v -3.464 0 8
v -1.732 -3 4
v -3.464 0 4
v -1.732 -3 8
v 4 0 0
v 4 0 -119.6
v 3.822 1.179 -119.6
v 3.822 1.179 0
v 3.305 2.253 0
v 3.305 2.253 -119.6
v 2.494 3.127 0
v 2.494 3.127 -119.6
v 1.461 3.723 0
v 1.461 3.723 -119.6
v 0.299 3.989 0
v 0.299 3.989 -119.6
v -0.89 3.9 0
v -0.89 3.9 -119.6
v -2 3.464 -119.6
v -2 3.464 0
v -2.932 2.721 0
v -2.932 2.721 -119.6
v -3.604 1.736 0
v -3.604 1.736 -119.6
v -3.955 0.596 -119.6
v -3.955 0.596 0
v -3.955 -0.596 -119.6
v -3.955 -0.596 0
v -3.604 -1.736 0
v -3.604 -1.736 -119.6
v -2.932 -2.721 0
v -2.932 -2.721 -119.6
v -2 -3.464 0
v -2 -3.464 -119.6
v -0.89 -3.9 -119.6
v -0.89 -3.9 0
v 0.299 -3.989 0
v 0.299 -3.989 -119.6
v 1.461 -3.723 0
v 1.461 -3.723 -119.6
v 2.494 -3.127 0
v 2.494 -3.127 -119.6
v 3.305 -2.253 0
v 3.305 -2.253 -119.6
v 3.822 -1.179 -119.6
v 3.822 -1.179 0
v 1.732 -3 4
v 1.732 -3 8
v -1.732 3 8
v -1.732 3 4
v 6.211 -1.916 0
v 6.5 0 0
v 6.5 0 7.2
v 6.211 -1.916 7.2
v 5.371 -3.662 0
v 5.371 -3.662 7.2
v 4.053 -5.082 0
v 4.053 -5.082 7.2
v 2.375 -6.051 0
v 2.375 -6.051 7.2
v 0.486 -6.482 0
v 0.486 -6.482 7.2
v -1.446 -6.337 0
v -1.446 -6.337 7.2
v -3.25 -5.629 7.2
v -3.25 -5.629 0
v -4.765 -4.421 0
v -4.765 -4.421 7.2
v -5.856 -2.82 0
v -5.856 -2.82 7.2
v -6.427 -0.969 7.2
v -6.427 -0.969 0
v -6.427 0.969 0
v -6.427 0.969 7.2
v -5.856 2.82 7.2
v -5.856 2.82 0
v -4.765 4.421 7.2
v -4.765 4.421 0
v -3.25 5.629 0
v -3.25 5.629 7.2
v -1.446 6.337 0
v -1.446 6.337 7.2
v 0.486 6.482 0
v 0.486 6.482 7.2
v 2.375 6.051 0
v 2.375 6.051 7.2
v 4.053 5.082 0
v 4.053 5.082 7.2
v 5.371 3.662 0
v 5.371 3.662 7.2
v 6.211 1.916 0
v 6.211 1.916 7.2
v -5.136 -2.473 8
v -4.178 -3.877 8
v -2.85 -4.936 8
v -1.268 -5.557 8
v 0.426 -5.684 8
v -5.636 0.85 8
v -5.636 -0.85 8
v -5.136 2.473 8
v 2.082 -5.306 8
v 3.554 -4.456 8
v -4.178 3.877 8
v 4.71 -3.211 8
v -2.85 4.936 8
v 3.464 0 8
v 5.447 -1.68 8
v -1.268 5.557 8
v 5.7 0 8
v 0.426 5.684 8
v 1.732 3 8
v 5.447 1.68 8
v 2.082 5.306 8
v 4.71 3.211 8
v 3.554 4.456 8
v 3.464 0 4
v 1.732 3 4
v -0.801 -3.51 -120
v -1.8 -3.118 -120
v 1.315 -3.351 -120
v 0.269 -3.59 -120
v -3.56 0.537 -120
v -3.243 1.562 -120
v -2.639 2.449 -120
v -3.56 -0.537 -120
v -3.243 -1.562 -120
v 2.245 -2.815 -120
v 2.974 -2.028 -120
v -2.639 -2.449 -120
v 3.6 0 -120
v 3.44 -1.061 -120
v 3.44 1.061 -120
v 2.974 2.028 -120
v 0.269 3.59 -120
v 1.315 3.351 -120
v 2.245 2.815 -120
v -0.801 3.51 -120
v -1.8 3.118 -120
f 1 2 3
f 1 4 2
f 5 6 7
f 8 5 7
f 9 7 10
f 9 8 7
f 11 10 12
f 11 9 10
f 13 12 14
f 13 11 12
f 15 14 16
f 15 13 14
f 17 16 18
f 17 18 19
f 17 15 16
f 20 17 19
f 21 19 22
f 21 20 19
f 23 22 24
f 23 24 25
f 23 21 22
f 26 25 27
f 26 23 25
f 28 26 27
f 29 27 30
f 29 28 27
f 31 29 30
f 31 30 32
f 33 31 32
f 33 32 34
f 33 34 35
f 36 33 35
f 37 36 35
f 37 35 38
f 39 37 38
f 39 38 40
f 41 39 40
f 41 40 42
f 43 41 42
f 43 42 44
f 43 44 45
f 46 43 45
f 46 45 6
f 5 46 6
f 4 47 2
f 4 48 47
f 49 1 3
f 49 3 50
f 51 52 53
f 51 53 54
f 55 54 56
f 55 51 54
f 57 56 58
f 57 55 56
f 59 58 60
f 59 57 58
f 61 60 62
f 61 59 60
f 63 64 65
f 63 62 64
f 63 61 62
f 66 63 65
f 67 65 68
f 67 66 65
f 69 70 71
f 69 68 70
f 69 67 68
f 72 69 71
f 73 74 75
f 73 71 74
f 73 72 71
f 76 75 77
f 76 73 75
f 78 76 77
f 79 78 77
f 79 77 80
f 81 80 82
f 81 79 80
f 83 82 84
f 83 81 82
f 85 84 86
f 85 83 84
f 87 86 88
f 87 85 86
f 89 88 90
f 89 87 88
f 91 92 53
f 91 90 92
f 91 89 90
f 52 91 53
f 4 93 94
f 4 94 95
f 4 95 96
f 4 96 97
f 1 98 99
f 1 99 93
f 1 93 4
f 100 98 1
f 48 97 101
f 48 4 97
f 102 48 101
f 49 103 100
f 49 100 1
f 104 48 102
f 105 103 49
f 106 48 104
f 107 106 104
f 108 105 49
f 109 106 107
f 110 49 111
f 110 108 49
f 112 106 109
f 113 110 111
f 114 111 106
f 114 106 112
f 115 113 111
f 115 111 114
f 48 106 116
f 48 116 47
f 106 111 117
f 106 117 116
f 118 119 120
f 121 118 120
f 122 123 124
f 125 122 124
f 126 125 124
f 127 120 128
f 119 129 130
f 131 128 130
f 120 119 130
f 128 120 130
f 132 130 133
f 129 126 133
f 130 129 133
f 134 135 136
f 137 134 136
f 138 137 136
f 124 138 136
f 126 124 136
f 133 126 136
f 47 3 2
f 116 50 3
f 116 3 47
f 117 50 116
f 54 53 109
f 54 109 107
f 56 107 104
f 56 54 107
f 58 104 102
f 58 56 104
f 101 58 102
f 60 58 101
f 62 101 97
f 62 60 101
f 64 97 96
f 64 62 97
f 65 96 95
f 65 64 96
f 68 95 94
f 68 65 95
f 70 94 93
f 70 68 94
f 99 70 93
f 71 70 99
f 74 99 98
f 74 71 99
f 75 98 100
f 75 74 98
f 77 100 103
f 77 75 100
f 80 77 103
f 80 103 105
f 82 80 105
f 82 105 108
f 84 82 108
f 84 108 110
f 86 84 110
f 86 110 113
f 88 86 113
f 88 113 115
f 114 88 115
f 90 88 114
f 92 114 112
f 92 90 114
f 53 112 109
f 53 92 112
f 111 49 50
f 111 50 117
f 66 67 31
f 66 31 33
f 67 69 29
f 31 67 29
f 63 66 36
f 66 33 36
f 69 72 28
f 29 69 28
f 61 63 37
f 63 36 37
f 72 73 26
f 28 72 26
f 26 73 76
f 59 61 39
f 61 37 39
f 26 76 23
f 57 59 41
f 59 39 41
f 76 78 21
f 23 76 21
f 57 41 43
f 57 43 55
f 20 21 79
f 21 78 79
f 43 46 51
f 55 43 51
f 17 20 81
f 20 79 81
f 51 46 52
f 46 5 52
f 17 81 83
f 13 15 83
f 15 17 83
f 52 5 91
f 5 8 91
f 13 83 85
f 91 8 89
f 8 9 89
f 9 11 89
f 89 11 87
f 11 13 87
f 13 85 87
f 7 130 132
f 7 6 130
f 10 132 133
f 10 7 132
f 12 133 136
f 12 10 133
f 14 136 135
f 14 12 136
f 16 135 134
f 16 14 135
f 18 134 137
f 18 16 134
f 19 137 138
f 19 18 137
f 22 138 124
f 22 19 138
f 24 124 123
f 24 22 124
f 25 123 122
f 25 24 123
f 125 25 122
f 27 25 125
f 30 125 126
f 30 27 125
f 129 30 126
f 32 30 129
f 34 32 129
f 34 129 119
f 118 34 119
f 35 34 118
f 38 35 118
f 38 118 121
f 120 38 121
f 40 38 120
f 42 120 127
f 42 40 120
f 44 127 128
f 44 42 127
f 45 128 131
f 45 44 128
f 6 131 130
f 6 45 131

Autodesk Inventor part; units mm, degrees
ref_plane "YZ Plane" through (0, 0, 0) normal (1, 0, 0) x (0, 1, 0)
ref_plane "XZ Plane" through (0, 0, 0) normal (0, 1, 0) x (-1, 0, 0)
ref_plane "XY Plane" through (0, 0, 0) normal (0, 0, 1) x (1, 0, 0)
sketch "Sketch3" plane through (0, 0, 0) normal (0, 0, 1) x (1, 0, 0)
  circle A0 centre (0, 0) radius 4
  dimension "Diameter" = 8
extrude "Extrusion1" add sketch "Sketch3" against normal blind 120
sketch "Sketch4" plane through (0, 0, 0) normal (0, 0, 1) x (1, 0, 0)
  circle A0 centre (0, 0) radius 4 projected
  circle A1 centre (0, 0) radius 6.5
  dimension "Head_Diameter" = 13
extrude "Extrusion2" add sketch "Sketch4" along normal blind 8 contours A0 | A1
sketch "Sketch5" plane through (0, 0, 8) normal (0, 0, 1) x (1, 0, 0)
  circle A0 centre (0, 0) radius 6.5 projected
  line L0 (3.4641, 0) -> (1.7321, -3)
  line L1 (1.7321, -3) -> (-1.7321, -3)
  line L2 (-1.7321, -3) -> (-3.4641, 0)
  line L3 (-3.4641, 0) -> (-1.7321, 3)
  line L4 (-1.7321, 3) -> (1.7321, 3)
  line L5 (1.7321, 3) -> (3.4641, 0)
  line L6 (0, 0) -> (3.4641, 0) construction
  dimension "Hex_Width" = 6
extrude "Extrusion3" cut sketch "Sketch5" against normal blind 4 contours L0 L1 L2 L3 L4 L5
thread "Thread1" size "M8x1.25" class "4g6g" standard "ANSI Metric M Profile" length 28
chamfer "Chamfer1" distance 0.8 angle 45 1 edges at (-6.5, 0, 8)
chamfer "Chamfer2" distance 0.4 angle 45 1 edges at (-4, 0, -120)
equation "\"d14\" = 0.5 * Chamfer"
equation "\"Chamfer\" = 0.8"
properties part number "SCREW,SOCKET HD,P,12.9,M8X1.25X120MM" material "Steel, MS"
